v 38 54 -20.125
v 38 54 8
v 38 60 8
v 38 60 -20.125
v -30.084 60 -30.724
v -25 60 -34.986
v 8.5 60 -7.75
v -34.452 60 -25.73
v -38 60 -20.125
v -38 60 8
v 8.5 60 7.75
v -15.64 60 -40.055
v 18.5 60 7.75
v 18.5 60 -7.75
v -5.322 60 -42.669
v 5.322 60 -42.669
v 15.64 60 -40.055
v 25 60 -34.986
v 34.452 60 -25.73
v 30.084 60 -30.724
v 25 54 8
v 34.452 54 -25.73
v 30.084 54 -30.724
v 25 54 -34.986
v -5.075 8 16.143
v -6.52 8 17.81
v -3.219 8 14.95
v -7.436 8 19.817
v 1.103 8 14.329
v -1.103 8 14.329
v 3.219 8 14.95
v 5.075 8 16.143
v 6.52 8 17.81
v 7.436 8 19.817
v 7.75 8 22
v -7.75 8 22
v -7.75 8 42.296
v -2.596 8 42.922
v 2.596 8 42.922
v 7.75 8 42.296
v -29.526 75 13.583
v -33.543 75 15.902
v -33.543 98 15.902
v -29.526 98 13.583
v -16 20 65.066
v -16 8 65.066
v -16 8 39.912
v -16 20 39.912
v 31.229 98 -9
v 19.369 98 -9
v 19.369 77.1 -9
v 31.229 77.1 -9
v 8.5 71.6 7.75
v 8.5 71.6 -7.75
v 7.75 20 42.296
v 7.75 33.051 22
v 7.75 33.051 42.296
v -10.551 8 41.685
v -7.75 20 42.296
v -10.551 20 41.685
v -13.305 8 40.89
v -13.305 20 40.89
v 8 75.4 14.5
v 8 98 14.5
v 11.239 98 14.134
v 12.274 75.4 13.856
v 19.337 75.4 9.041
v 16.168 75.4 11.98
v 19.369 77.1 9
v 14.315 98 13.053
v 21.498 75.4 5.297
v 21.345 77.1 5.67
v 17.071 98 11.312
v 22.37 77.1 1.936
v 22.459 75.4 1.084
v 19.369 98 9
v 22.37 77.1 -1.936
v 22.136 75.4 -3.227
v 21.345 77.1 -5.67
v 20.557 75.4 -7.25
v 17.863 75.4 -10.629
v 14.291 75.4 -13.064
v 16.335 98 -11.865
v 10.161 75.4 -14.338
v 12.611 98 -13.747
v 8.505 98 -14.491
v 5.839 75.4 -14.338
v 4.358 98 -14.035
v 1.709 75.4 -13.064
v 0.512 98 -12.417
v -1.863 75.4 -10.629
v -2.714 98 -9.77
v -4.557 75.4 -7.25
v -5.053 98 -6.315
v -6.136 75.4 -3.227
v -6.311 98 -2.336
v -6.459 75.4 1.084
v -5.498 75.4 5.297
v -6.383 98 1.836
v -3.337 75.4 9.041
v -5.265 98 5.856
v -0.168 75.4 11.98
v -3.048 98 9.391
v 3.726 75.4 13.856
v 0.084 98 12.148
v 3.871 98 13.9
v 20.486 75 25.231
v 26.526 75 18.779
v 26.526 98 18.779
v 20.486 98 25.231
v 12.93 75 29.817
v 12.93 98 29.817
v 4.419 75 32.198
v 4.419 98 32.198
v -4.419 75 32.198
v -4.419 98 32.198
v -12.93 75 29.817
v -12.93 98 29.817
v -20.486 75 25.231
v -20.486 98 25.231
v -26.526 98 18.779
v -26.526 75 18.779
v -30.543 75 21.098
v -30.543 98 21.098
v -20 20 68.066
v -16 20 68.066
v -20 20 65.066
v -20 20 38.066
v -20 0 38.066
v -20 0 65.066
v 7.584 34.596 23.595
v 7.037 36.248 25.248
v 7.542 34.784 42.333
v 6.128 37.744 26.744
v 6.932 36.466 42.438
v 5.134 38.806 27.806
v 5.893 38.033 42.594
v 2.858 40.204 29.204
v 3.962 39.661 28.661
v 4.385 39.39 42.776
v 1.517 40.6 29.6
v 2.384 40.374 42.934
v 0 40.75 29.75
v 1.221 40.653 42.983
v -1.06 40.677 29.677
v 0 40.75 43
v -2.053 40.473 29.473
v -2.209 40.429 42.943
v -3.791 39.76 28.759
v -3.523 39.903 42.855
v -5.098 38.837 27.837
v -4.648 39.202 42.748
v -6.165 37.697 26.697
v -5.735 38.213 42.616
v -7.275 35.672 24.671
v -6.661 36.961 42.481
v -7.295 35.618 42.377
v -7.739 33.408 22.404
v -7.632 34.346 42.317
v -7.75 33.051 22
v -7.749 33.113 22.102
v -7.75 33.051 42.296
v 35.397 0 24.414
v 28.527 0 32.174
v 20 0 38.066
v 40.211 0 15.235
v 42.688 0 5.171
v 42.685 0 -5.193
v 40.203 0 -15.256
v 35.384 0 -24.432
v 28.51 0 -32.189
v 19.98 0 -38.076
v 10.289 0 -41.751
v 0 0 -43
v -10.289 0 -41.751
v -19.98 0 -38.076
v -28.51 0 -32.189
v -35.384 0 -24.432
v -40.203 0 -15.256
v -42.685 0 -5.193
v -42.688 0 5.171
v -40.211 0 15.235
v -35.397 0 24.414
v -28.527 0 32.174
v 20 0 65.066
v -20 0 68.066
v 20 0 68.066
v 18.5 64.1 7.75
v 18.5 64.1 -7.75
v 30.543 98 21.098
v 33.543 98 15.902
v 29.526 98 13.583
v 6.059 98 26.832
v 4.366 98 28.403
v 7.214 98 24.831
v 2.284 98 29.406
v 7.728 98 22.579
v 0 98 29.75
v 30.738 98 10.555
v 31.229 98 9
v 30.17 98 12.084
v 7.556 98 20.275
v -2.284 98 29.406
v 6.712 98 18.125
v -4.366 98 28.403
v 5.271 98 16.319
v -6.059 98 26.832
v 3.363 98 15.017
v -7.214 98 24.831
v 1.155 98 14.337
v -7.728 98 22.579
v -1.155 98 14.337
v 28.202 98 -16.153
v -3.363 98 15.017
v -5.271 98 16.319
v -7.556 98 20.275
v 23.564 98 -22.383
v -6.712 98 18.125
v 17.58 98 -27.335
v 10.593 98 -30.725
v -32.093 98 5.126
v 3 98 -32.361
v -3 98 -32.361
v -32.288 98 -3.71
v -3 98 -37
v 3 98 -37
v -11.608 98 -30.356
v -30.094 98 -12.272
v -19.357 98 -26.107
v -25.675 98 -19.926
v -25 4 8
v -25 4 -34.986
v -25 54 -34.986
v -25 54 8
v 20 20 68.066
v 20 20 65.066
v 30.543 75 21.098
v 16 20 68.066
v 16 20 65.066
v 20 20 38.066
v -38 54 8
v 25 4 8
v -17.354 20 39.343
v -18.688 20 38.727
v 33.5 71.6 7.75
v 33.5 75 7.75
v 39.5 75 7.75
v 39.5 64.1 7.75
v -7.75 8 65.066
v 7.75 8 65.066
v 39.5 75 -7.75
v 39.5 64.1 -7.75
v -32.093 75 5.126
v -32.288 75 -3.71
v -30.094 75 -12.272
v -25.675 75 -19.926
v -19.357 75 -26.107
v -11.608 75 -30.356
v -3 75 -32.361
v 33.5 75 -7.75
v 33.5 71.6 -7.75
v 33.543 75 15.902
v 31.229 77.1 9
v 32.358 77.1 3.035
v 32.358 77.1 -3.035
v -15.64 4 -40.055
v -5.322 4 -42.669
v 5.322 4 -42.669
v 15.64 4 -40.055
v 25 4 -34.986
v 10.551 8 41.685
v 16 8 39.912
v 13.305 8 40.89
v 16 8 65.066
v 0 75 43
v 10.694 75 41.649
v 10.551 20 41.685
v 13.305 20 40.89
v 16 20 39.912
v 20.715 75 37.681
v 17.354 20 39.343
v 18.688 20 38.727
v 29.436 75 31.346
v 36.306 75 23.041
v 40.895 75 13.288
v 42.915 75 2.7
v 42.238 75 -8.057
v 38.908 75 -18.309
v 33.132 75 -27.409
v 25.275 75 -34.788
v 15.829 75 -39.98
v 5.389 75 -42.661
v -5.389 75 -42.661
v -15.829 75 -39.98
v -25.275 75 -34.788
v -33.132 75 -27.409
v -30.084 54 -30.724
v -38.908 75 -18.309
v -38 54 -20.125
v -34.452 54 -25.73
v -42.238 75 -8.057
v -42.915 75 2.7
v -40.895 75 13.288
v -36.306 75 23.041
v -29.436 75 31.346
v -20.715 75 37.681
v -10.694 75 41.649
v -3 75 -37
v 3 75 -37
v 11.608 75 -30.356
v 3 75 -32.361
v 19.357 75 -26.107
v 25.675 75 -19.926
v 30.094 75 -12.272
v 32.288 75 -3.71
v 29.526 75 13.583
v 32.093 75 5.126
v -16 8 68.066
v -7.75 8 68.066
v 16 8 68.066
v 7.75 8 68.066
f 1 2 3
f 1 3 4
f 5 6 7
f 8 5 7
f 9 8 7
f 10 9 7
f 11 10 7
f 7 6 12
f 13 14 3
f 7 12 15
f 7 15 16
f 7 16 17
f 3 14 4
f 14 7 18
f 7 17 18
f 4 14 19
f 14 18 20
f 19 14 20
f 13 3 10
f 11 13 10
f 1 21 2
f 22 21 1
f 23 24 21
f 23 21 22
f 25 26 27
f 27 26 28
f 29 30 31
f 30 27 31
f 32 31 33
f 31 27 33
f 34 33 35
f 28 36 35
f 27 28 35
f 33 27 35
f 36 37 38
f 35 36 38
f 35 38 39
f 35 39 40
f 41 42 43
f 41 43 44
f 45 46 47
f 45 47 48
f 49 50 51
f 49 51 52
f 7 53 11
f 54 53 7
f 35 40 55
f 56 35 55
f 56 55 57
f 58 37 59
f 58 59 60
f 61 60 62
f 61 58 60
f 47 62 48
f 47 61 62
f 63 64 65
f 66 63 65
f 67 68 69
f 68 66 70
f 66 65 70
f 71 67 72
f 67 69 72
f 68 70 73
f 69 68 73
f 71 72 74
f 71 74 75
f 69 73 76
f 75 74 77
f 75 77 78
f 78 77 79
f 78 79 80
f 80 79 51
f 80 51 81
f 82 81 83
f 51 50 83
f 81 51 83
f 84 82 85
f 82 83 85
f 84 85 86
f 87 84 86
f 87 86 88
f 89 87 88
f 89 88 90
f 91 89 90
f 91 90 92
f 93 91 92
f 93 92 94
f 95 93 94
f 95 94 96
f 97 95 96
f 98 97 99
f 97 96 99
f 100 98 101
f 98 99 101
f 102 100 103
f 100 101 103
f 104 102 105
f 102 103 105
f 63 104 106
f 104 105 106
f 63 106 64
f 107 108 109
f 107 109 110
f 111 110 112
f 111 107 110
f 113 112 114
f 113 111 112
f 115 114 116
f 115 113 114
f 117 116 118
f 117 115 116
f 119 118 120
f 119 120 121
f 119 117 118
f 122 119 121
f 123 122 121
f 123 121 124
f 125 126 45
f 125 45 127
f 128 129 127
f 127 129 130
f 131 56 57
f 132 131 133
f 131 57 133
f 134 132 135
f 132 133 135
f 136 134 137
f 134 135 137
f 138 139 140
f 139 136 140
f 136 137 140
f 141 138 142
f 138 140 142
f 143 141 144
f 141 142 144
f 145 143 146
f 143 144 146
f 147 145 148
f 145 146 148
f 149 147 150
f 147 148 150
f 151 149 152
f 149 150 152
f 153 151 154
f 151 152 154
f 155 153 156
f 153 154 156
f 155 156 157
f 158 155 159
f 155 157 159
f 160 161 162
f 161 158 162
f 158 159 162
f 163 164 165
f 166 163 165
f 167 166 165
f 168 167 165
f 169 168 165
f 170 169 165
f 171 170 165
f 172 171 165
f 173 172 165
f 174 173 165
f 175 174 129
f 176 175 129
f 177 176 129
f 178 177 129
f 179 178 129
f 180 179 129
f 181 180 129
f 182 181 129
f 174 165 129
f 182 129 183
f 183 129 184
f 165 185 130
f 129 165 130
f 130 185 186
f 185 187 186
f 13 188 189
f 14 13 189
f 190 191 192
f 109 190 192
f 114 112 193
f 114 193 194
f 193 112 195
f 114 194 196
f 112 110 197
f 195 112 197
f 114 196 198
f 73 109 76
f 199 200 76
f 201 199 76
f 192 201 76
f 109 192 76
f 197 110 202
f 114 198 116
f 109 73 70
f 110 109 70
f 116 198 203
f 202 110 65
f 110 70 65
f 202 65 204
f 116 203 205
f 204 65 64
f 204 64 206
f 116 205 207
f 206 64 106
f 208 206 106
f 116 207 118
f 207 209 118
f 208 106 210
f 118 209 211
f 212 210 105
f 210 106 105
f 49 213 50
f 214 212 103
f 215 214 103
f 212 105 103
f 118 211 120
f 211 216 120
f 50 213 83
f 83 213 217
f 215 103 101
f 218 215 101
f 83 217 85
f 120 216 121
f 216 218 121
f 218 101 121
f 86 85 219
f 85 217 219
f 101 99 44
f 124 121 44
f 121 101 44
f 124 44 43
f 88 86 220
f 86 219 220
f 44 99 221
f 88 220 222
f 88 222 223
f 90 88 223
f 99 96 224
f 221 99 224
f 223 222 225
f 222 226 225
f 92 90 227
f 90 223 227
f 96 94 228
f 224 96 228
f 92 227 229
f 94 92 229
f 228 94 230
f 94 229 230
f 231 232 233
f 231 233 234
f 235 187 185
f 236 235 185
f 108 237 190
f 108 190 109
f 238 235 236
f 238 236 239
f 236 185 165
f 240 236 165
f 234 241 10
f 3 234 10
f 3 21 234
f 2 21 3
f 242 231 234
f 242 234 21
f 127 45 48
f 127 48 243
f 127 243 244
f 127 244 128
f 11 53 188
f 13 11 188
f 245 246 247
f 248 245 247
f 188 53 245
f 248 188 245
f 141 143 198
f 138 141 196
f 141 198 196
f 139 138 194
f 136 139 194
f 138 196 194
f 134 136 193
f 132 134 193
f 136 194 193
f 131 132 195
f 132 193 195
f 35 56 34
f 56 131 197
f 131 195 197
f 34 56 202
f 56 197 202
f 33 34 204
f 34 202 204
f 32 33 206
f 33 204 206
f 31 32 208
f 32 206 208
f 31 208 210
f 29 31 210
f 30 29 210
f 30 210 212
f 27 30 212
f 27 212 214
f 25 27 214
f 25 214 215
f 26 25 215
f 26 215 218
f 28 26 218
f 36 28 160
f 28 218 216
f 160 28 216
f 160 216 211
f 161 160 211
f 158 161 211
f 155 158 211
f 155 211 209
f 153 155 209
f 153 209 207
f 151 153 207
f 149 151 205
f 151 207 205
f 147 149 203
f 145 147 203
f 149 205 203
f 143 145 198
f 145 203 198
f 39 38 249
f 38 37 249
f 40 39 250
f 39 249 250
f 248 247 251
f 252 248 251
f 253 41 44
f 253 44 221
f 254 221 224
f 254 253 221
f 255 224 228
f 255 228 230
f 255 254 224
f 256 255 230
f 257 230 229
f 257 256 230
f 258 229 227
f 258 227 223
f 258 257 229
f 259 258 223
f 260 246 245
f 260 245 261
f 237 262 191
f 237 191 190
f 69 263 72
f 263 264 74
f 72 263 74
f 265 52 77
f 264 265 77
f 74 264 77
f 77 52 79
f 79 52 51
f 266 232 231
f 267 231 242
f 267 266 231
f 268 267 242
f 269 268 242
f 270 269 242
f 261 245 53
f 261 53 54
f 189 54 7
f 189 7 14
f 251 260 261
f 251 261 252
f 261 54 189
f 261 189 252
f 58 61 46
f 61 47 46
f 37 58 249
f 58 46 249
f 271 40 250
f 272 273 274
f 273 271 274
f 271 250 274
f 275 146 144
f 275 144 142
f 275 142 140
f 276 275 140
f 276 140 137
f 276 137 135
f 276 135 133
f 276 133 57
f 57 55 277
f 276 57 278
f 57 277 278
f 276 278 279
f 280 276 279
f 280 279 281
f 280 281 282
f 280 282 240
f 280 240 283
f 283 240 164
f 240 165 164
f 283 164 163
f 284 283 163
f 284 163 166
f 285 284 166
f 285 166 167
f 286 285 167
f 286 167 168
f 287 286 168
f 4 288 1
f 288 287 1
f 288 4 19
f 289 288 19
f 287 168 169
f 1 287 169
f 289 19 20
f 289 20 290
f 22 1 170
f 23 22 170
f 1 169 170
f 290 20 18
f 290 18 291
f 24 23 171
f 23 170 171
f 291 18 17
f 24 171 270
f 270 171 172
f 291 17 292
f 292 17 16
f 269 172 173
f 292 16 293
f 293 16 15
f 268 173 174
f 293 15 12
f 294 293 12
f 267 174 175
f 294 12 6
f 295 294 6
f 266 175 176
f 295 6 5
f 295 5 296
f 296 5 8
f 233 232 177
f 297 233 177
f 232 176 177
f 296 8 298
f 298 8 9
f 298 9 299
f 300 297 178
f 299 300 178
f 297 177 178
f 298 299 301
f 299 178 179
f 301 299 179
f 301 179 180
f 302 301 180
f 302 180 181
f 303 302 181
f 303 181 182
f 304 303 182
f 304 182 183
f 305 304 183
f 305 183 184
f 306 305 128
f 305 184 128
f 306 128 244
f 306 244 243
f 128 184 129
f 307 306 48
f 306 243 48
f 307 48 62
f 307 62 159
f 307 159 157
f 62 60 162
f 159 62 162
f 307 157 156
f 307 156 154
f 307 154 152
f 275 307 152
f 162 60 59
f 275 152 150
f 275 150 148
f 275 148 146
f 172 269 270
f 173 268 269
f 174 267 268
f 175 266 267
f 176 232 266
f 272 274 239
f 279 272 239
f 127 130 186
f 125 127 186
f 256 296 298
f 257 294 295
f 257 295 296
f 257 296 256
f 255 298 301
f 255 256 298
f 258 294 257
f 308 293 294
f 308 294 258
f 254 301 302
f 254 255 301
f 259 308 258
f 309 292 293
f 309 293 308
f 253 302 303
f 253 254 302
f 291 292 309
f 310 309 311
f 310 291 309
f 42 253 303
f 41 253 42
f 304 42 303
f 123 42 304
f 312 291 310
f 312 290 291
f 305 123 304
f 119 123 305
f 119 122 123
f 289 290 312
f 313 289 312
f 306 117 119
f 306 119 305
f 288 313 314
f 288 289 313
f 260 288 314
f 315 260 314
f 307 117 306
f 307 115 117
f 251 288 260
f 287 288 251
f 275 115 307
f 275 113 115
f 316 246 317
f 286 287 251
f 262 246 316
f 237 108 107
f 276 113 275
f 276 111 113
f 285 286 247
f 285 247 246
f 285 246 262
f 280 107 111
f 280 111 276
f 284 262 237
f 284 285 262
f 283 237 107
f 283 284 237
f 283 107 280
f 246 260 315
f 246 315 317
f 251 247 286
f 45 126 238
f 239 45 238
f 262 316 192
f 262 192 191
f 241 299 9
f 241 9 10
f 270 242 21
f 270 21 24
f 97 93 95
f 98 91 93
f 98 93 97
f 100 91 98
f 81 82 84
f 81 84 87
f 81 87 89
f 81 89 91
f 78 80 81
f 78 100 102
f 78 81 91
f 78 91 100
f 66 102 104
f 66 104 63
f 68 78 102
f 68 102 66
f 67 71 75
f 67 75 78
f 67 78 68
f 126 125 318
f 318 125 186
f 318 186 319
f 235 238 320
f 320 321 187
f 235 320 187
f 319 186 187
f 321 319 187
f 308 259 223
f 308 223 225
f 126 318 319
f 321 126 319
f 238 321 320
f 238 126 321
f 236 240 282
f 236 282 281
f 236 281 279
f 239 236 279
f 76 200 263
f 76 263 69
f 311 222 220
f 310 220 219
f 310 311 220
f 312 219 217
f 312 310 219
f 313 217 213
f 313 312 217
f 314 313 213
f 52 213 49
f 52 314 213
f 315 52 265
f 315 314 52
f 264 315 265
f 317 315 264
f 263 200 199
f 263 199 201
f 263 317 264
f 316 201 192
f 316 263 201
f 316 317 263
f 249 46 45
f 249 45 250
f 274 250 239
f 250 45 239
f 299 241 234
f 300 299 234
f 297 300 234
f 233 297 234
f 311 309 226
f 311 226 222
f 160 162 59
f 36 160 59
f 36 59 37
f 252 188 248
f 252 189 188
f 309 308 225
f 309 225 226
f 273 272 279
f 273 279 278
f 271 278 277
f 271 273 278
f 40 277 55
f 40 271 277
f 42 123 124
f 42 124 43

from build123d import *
from build123d.topology import SkipClean

# Parameters (mm, degrees)
SKETCH2_R                = 43
BOSS_EXTRUDE1_DEPTH      = 75
BOSS_EXTRUDE2_DEPTH      = 23
SKETCH4_R                = 14.5
CUT_EXTRUDE2_DEPTH       = 22.6
CUT_EXTRUDE3_START       = -20.9
CUT_EXTRUDE3_DEPTH       = 20.9
CUT_EXTRUDE6_START       = 4
CUT_EXTRUDE6_DEPTH       = 56
CUT_EXTRUDE6_START_2     = 54
CUT_EXTRUDE6_2_DEPTH     = 6
SKETCH8_W                = 6
SKETCH8_H                = 15.5
CUT_EXTRUDE7_DEPTH       = 13
SKETCH10_W               = 15.5
SKETCH10_H               = 7.5
CUT_EXTRUDE8_DEPTH       = 25
SKETCH12_W               = 10
SKETCH12_H               = 15.5
CUT_EXTRUDE9_DEPTH       = 8
SKETCH7_R                = 7.75
CUT_EXTRUDE10_DEPTH      = 90
BOSS_EXTRUDE3_DEPTH      = 20
CUT_EXTRUDE11_REACH      = 156.236
CUT_EXTRUDE12_REACH      = 156.236
CUT_EXTRUDE12_END_RADIUS = 43
SKETCH16_W               = 32
SKETCH16_H               = 12
SKETCH17_W               = 40
SKETCH17_H               = 20
BOSS_EXTRUDE4_DEPTH      = 3


# Read off the part's stored shape, not the designer's step: Cut-Extrude6
with BuildPart() as part:
    # Sketch2 → Boss-Extrude1 (new body)
    with BuildSketch(Plane(origin=(0, 0, 0), x_dir=(1, 0, 0), z_dir=(0, 1, 0))):
        with Locations(Location((0, 0, 0), (0, 0, 270))):
            Circle(SKETCH2_R)
    extrude(amount=BOSS_EXTRUDE1_DEPTH)

    # Sketch3 → Boss-Extrude2 (add)
    with BuildSketch(Plane(origin=(0, 75, 0), x_dir=(1, 0, 0), z_dir=(0, 1, 0))):
        with BuildLine():
            Line((-3, 32.361242251), (-3, 37))
            Line((-3, 37), (3, 37))
            Line((3, 37), (3, 32.361242251))
            ThreePointArc((3, 32.361242251), (28.145825623, 16.25), (29.525657887, -13.582544914))
            Line((29.525657887, -13.582544914), (33.54293994, -15.901923789))
            Line((33.54293994, -15.901923789), (30.54293994, -21.098076211))
            Line((30.54293994, -21.098076211), (26.525657887, -18.778697337))
            ThreePointArc((26.525657887, -18.778697337), (0, -32.5), (-26.525657887, -18.778697337))
            Line((-26.525657887, -18.778697337), (-30.54293994, -21.098076211))
            Line((-30.54293994, -21.098076211), (-33.54293994, -15.901923789))
            Line((-33.54293994, -15.901923789), (-29.525657887, -13.582544914))
            ThreePointArc((-29.525657887, -13.582544914), (-28.145825623, 16.25), (-3, 32.361242251))
        make_face()
    extrude(amount=BOSS_EXTRUDE2_DEPTH)

    # Sketch4 → Cut-Extrude2 (cut)
    with BuildSketch(Plane(origin=(0, 98, 0), x_dir=(1, 0, 0), z_dir=(0, 1, 0))):
        with Locations(Location((8, 0, 0), (0, 0, 270))):
            Circle(SKETCH4_R)
    extrude(amount=-CUT_EXTRUDE2_DEPTH, mode=Mode.SUBTRACT)

    # Sketch5 → Cut-Extrude3 (cut)
    with BuildSketch(Plane(origin=(0, 98, 0), x_dir=(1, 0, 0), z_dir=(0, 1, 0)).offset(CUT_EXTRUDE3_START)):
        with BuildLine():
            Line((19.368817001, 9), (31.228992939, 9))
            ThreePointArc((31.228992939, 9), (32.5, 0), (31.228992939, -9))
            Line((31.228992939, -9), (19.368817001, -9))
            ThreePointArc((19.368817001, -9), (22.5, 0), (19.368817001, 9))
        make_face()
    extrude(amount=CUT_EXTRUDE3_DEPTH, mode=Mode.SUBTRACT)

    # Cut-Extrude6 outline → Cut-Extrude6 (cut)
    with BuildSketch(Plane(origin=(0, 0, 0), x_dir=(1, 0, 0), z_dir=(0, 1, 0)).offset(CUT_EXTRUDE6_START)):
        with BuildLine():
            Line((-25, 34.985711369), (-25, -8))
            Line((-25, -8), (25, -8))
            Line((25, -8), (25, 34.985711369))
            ThreePointArc((25, 34.985711369), (0, 43), (-25, 34.985711369))
        make_face()
    extrude(amount=CUT_EXTRUDE6_DEPTH, mode=Mode.SUBTRACT)

    # Cut-Extrude6 2 outline → Cut-Extrude6 2 (cut)
    with BuildSketch(Plane(origin=(0, 0, 0), x_dir=(1, 0, 0), z_dir=(0, 1, 0)).offset(CUT_EXTRUDE6_START_2)):
        with BuildLine():
            Line((-38, 20.124611797), (-38, -8))
            Line((-38, -8), (-25, -8))
            Line((-25, -8), (-25, 34.985711369))
            ThreePointArc((-25, 34.985711369), (-32.36453414, 28.311427549), (-38, 20.124611797))
        make_face()
        with BuildLine():
            Line((25, 34.985711369), (25, -8))
            Line((25, -8), (38, -8))
            Line((38, -8), (38, 20.124611797))
            ThreePointArc((38, 20.124611797), (32.36453414, 28.311427549), (25, 34.985711369))
        make_face()
    extrude(amount=CUT_EXTRUDE6_2_DEPTH, mode=Mode.SUBTRACT)

    # Sketch8 → Cut-Extrude7 (cut)
    with BuildSketch(Plane(origin=(0, 77.1, 0), x_dir=(1, 0, 0), z_dir=(0, 1, 0))):
        with Locations((36.5, 0)):
            Rectangle(SKETCH8_W, SKETCH8_H)
    extrude(amount=-CUT_EXTRUDE7_DEPTH, mode=Mode.SUBTRACT)

    # Sketch10 → Cut-Extrude8 (cut)
    with BuildSketch(Plane(origin=(33.5, 0, 0), x_dir=(0, 0, -1), z_dir=(1, 0, 0))):
        with Locations((0, 67.85)):
            Rectangle(SKETCH10_W, SKETCH10_H)
    extrude(amount=-CUT_EXTRUDE8_DEPTH, mode=Mode.SUBTRACT)

    # Sketch12 → Cut-Extrude9 (cut)
    with BuildSketch(Plane(origin=(0, 64.1, 0), x_dir=(1, 0, 0), z_dir=(0, 1, 0))):
        with Locations((13.5, 0)):
            Rectangle(SKETCH12_W, SKETCH12_H)
    extrude(amount=-CUT_EXTRUDE9_DEPTH, mode=Mode.SUBTRACT)

    # Sketch7 → Cut-Extrude10 (cut)
    with BuildSketch(Plane(origin=(0, 98, 0), x_dir=(1, 0, 0), z_dir=(0, 1, 0))):
        with Locations(Location((0, -22, 0), (0, 0, 270))):
            Circle(SKETCH7_R)
    extrude(amount=-CUT_EXTRUDE10_DEPTH, mode=Mode.SUBTRACT)

    # Sketch13 → Boss-Extrude3 (add)
    with BuildSketch(Plane.XZ):
        with BuildLine():
            Line((-20, 38.065732621), (-20, 68.065732621))
            Line((-20, 68.065732621), (20, 68.065732621))
            Line((20, 68.065732621), (20, 38.065732621))
            ThreePointArc((20, 38.065732621), (0, 43), (-20, 38.065732621))
        make_face()
    extrude(amount=-BOSS_EXTRUDE3_DEPTH)

    # Sketch14 → Cut-Extrude11 (cut, up to next)
    with BuildSketch(Plane.XY.offset(68.065732621), mode=Mode.PRIVATE) as cut_extrude11_sk1:
        with BuildLine():
            Line((-7.75, 8), (7.75, 8))
            Line((7.75, 8), (7.75, 33.050905548))
            ThreePointArc((7.75, 33.050905548), (0, 40.750167184), (-7.75, 33.050905548))
            Line((-7.75, 33.050905548), (-7.75, 8))
        make_face()
    cut_extrude11_tool1 = extrude(cut_extrude11_sk1.sketch, amount=-CUT_EXTRUDE11_REACH, mode=Mode.PRIVATE) & part.part
    add(cut_extrude11_tool1.solids().sort_by_distance((0, 23.591664, 68.065733))[0], mode=Mode.SUBTRACT)

    # Cut-Extrude12: up to this cylinder (the profile starts outside it)
    with SkipClean():  # the faces are left unmerged after this step: merging them gives an invalid solid
        cut_extrude12_end = Plane(origin=(0, 14, 0), z_dir=(0, -1, 0)) * Cylinder(CUT_EXTRUDE12_END_RADIUS, 399.472, mode=Mode.PRIVATE)
        # Sketch16 → Cut-Extrude12 (cut, up to the surface)
        with BuildSketch(Plane.XY.offset(68.065732621), mode=Mode.PRIVATE) as cut_extrude12_sk1:
            with Locations((0, 14)):
                Rectangle(SKETCH16_W, SKETCH16_H)
        cut_extrude12_tool1 = extrude(cut_extrude12_sk1.sketch, amount=-CUT_EXTRUDE12_REACH, mode=Mode.PRIVATE) - cut_extrude12_end
        add(cut_extrude12_tool1.solids().sort_by_distance((0, 14, 68.065733))[0], mode=Mode.SUBTRACT)

    # Sketch17 → Boss-Extrude4 (add)
    with SkipClean():  # the faces are left unmerged after this step: merging them gives an invalid solid
        with BuildSketch(Plane.XY.offset(68.065732621)):
            with Locations((0, 10)):
                Rectangle(SKETCH17_W, SKETCH17_H)
        extrude(amount=-BOSS_EXTRUDE4_DEPTH)


solid = part.part
